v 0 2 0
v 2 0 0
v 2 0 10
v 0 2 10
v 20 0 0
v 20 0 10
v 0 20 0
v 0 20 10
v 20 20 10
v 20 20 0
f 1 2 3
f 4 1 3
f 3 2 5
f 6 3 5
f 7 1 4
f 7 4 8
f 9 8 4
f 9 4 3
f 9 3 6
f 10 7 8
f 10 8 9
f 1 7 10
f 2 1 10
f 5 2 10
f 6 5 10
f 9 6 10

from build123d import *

# Parameters (mm, degrees)
SKETCH_1_W                = 20
SKETCH_1_H                = 20
BASEBOX_DEPTH             = 10
CHAMFERANGLEDISTANCE_SIZE = 2


with BuildPart() as part:
    # 草图1 → BaseBox (new body)
    with BuildSketch(Plane.XY):
        with Locations((10, 10)):
            Rectangle(SKETCH_1_W, SKETCH_1_H)
    extrude(amount=BASEBOX_DEPTH)

    # ChamferAngleDistance
    chamferangledistance_edges = [part.edges().sort_by_distance(p)[0] for p in [
        (0, 0, 5),
    ]]
    chamfer(chamferangledistance_edges, length=CHAMFERANGLEDISTANCE_SIZE)


solid = part.part
